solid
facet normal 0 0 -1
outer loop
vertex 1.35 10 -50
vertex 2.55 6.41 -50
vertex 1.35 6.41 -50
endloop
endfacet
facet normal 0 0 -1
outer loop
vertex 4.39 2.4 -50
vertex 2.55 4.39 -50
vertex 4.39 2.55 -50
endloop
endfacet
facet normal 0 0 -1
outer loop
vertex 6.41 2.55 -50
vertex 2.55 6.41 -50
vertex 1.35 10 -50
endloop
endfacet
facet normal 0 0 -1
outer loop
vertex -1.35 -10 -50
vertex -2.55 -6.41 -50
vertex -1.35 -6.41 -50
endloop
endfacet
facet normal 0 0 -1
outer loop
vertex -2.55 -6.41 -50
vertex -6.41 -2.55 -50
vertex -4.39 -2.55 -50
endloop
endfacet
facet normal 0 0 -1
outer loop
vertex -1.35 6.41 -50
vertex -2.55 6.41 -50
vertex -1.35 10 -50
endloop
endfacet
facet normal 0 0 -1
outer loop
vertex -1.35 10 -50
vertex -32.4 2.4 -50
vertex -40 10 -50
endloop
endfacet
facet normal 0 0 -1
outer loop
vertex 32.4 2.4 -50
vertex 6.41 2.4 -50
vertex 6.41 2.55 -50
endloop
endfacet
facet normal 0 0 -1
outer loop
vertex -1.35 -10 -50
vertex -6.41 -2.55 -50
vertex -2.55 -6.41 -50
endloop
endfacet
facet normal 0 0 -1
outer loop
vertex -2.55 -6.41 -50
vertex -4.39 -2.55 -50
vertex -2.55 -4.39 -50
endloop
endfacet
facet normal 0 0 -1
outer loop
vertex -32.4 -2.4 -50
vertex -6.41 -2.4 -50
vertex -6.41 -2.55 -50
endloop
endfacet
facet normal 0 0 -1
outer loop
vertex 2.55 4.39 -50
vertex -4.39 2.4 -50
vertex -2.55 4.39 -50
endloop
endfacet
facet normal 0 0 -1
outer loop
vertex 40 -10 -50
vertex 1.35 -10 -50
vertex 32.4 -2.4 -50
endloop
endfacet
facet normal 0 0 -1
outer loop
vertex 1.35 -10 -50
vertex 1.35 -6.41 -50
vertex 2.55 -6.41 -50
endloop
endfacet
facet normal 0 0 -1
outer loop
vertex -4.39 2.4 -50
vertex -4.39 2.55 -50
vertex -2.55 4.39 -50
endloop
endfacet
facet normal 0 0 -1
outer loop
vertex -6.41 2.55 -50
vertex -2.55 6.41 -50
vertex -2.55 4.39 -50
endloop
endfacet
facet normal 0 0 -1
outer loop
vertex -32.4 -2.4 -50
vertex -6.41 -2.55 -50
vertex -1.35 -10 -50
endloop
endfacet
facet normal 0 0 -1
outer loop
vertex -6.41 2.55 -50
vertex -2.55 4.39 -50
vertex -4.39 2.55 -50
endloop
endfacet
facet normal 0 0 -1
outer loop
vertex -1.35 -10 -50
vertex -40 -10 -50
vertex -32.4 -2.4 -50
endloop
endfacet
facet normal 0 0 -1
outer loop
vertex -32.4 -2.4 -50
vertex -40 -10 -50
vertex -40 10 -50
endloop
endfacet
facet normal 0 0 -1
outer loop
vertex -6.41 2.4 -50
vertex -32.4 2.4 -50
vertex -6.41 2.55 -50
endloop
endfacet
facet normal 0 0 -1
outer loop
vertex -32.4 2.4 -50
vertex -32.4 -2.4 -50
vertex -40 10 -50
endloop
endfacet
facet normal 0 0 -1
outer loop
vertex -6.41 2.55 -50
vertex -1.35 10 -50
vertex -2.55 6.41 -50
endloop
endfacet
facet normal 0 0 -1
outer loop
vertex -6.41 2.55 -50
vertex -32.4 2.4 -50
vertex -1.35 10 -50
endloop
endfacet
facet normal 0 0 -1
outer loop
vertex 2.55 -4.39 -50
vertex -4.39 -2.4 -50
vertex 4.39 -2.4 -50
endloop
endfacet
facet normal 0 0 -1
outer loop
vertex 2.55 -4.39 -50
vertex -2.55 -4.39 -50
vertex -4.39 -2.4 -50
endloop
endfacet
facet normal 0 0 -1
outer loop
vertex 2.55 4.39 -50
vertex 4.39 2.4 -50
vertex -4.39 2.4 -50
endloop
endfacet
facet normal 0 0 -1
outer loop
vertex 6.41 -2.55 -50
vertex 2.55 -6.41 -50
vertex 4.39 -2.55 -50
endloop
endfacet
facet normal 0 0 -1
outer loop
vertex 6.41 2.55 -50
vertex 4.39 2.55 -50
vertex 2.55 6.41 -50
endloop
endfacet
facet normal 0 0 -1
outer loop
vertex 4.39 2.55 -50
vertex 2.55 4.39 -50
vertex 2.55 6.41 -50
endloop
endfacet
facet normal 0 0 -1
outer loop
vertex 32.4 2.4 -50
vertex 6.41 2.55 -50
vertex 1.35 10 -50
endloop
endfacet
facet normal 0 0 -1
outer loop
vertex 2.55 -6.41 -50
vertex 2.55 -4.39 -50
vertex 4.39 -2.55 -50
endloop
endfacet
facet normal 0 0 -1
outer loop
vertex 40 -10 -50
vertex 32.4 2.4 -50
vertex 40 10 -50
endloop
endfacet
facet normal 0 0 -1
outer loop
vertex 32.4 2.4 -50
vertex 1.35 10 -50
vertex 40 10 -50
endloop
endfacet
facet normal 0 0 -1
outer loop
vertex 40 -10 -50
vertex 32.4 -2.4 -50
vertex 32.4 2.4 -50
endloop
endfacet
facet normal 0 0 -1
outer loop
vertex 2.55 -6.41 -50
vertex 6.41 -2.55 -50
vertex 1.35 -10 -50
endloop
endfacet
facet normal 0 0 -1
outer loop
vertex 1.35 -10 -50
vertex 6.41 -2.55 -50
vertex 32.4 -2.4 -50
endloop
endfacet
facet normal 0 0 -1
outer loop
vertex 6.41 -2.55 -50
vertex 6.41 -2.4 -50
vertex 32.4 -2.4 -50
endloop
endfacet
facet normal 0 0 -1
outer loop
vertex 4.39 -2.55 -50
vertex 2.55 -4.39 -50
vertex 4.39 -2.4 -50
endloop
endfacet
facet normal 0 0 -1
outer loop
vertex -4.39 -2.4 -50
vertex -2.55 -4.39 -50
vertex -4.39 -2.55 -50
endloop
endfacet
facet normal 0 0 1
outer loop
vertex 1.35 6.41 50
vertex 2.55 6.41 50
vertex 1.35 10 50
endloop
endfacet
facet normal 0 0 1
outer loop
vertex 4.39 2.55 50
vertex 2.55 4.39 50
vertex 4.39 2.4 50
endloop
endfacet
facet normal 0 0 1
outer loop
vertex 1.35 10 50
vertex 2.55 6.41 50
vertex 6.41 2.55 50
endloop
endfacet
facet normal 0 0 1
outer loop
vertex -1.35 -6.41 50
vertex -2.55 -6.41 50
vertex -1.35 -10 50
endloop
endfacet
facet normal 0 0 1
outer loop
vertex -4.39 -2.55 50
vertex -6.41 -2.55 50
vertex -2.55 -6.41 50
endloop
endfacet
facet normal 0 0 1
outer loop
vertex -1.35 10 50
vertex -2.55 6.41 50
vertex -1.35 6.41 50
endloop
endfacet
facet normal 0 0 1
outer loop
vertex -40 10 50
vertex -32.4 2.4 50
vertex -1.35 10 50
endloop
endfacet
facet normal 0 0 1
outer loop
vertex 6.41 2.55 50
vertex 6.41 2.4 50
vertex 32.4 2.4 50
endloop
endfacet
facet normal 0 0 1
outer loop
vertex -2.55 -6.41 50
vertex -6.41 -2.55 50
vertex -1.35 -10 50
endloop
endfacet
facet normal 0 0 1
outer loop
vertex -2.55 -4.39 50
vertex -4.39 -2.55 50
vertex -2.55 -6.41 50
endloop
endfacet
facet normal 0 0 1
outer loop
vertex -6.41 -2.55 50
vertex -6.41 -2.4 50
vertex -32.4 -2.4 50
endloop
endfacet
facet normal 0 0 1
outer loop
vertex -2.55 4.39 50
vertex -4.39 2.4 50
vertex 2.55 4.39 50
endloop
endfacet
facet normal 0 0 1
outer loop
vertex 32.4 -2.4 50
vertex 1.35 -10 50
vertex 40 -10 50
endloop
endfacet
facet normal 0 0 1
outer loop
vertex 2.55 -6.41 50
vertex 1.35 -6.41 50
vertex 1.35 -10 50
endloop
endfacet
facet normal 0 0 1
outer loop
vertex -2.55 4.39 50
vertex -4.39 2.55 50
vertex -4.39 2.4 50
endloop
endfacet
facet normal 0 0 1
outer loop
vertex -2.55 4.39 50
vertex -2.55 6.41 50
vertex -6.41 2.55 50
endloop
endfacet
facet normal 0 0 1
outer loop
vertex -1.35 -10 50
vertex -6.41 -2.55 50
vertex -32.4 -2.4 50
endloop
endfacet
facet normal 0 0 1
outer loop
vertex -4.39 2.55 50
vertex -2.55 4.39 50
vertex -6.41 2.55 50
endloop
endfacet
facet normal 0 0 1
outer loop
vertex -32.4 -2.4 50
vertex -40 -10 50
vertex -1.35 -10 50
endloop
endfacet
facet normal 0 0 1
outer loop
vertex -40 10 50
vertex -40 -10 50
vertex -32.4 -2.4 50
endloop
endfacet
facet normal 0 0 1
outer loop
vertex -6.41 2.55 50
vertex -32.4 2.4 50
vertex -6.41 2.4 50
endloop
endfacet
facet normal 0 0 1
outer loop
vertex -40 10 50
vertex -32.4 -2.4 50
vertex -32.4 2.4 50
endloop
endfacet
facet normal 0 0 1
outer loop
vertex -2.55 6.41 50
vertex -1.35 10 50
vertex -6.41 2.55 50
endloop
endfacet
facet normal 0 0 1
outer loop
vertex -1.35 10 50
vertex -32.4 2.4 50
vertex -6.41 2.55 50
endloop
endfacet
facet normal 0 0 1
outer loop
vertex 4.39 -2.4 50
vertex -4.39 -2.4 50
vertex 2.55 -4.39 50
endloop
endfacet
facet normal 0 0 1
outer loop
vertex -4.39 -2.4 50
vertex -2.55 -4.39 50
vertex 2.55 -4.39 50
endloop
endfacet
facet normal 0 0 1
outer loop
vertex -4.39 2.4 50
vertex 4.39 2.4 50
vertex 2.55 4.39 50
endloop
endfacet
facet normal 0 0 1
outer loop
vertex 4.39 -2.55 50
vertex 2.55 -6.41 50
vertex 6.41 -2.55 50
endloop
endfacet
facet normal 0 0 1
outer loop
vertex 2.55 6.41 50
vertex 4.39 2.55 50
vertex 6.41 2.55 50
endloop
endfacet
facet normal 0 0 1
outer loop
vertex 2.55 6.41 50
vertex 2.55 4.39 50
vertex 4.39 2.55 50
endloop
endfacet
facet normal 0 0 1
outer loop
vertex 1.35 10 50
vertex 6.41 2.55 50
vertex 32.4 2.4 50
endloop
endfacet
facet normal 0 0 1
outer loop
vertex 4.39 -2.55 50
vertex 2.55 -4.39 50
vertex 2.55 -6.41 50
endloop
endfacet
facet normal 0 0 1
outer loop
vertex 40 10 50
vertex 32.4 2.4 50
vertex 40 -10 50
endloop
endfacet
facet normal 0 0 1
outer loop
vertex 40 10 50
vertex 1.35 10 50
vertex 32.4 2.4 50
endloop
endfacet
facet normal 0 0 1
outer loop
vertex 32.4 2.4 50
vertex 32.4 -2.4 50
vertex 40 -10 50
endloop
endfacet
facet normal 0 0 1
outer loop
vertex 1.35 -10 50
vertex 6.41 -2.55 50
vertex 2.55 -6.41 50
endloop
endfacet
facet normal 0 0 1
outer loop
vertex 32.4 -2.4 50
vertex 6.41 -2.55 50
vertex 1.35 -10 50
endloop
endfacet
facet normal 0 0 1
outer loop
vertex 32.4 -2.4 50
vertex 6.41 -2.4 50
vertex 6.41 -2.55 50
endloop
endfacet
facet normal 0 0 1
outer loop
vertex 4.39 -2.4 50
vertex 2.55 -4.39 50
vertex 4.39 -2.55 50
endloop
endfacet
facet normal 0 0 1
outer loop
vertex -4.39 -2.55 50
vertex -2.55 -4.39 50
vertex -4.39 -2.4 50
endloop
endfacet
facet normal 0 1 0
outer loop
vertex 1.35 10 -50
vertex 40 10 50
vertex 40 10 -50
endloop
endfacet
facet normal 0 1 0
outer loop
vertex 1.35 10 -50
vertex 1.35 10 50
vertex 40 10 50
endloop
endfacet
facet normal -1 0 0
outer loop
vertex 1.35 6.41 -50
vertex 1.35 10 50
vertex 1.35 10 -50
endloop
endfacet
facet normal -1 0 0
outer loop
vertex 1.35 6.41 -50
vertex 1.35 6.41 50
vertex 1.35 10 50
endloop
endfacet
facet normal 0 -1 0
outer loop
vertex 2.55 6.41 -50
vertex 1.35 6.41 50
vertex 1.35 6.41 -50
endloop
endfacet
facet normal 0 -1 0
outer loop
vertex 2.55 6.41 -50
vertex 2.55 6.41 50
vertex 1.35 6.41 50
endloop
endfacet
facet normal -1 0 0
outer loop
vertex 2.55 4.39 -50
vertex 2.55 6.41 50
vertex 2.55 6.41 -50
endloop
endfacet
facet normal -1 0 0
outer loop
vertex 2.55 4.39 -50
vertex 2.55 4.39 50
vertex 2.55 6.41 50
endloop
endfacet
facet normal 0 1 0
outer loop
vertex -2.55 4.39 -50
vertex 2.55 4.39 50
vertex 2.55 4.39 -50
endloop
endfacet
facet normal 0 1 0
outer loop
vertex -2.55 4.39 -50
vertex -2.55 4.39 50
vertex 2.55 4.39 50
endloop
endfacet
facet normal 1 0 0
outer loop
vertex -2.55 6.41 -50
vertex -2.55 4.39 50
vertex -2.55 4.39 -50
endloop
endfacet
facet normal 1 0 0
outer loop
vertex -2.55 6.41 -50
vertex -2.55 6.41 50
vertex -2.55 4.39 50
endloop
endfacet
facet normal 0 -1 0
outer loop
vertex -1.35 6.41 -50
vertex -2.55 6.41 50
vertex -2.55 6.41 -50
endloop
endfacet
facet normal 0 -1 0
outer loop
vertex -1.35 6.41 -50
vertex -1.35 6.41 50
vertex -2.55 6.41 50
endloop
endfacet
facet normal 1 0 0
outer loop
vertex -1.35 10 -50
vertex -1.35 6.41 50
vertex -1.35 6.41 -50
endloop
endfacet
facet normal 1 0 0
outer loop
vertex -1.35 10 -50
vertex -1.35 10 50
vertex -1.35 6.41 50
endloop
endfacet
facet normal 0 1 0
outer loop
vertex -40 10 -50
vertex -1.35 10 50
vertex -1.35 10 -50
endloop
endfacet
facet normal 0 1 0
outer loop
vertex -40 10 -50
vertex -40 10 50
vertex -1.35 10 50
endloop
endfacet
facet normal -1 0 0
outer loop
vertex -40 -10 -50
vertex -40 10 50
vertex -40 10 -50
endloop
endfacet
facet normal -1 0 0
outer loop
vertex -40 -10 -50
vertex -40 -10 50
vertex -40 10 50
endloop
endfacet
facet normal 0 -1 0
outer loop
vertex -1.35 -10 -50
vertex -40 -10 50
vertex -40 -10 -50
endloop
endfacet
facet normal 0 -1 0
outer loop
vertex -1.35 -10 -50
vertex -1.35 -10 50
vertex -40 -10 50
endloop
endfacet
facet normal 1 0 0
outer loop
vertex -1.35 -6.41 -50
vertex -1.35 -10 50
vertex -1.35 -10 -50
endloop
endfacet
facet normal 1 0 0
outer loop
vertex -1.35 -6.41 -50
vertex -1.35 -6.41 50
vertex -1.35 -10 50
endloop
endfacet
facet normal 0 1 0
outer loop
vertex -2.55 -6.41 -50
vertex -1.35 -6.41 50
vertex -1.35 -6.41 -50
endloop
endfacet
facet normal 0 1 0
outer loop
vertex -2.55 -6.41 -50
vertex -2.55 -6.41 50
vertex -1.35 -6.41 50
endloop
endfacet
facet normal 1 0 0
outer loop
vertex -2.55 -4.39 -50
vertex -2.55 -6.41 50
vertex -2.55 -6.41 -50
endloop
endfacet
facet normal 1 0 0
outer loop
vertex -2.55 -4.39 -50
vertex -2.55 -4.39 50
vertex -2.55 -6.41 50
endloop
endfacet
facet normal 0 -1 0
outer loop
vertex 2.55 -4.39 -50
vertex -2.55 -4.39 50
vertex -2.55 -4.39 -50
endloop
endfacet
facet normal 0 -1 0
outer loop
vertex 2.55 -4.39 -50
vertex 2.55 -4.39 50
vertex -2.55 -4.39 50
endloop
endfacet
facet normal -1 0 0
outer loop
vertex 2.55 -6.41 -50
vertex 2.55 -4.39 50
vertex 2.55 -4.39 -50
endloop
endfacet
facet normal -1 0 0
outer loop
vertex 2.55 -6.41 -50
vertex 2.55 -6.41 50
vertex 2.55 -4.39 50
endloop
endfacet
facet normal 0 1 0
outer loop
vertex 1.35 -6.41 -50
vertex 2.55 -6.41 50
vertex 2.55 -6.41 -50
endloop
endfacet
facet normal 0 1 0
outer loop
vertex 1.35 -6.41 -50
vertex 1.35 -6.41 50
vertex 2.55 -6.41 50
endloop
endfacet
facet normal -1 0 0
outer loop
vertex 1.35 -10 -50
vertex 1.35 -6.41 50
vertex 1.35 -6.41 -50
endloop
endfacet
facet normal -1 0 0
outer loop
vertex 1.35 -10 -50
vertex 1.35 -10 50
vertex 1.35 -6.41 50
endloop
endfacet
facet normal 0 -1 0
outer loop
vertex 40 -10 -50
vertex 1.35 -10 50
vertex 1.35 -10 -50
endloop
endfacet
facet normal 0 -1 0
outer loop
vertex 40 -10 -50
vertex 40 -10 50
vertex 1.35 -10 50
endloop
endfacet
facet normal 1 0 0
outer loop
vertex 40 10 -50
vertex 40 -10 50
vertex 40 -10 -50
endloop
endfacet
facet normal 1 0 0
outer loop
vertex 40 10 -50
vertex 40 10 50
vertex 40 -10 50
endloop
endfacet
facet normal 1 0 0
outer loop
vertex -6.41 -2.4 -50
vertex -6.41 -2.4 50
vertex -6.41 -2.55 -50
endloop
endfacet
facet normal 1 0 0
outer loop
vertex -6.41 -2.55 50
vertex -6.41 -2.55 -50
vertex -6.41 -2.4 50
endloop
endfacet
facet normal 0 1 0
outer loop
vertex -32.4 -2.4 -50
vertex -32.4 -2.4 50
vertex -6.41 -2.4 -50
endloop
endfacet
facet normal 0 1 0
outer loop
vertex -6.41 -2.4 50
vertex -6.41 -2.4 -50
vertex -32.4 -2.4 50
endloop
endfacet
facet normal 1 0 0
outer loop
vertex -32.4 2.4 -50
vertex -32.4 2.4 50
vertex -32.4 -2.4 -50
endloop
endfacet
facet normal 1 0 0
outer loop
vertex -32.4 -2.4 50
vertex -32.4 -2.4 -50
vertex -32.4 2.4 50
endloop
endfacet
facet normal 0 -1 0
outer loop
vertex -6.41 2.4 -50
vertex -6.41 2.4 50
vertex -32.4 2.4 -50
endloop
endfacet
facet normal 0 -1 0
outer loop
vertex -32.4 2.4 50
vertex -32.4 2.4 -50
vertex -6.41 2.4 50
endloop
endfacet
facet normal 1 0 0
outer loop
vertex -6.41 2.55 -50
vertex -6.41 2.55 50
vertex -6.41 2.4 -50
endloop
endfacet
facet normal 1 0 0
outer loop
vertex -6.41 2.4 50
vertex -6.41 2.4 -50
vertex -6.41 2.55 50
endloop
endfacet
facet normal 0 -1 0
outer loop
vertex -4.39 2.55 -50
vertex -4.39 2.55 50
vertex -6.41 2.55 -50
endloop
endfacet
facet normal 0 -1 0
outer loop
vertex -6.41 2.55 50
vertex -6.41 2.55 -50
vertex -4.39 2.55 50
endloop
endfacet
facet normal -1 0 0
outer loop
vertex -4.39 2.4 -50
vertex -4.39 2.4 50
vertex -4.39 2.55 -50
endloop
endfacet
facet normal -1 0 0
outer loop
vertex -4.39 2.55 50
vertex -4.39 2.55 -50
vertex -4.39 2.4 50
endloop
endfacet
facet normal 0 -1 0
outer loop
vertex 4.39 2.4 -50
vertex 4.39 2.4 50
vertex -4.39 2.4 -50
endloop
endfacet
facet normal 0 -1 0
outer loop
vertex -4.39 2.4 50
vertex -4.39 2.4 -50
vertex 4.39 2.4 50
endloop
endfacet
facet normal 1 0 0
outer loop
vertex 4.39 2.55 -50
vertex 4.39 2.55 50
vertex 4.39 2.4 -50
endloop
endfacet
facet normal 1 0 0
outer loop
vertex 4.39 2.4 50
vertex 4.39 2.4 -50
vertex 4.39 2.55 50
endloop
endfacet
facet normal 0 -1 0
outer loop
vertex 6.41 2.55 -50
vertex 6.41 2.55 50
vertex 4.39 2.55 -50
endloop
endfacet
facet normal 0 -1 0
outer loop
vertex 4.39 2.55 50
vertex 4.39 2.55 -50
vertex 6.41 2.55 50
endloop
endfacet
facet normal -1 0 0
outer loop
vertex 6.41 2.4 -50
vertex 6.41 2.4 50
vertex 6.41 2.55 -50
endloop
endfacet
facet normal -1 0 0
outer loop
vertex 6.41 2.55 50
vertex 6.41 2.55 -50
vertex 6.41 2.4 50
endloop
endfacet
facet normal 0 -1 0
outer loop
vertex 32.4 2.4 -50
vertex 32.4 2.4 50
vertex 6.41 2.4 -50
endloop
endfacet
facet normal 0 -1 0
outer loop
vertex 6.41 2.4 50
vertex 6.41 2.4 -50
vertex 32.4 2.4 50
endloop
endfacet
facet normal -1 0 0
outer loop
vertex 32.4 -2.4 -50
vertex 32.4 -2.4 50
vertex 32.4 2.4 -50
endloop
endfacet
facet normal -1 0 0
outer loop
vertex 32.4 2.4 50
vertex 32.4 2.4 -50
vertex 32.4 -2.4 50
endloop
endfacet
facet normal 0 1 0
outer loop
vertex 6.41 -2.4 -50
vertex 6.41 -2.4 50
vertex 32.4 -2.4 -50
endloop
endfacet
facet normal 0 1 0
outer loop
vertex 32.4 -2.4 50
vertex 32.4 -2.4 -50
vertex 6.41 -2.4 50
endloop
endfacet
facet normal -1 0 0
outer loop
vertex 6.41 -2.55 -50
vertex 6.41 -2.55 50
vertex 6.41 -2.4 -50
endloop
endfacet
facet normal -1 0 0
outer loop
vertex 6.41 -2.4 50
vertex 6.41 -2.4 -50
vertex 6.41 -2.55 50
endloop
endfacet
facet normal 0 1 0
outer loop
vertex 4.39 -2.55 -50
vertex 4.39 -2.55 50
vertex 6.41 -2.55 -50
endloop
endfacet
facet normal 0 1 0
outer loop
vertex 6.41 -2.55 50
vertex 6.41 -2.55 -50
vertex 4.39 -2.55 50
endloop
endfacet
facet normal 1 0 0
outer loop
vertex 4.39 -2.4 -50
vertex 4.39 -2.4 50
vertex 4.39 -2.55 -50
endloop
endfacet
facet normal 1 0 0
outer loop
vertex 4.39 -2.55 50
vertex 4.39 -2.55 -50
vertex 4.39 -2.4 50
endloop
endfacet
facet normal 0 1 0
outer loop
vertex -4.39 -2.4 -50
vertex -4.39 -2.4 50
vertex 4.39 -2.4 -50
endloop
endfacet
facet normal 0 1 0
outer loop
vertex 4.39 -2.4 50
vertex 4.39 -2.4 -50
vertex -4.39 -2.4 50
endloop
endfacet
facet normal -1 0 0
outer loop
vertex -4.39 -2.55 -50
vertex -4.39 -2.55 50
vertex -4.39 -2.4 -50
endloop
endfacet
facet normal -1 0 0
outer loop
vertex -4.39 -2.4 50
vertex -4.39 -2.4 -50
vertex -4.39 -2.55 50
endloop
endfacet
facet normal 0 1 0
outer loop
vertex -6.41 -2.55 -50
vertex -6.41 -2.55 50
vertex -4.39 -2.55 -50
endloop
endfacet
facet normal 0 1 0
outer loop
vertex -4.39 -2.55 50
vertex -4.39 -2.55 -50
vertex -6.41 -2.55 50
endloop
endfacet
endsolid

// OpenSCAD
$fn = 64;

// 20x80 aluminium extrusion profile with 4 T-slots (approximation), 100mm long
length = 100;
w = 80;
h = 20;

module extrusion_20x80(len=100, w=80, h=20) {

    // Dimension-derived parameters (no arbitrary placement)
    t = min(w,h) * 0.10;                 // outer wall thickness
    slot_open = min(w,h) * 0.30;         // slot mouth width
    slot_depth = min(w,h) * 0.28;        // depth from outer face to inner cavity
    slot_neck = slot_open * 0.45;        // narrow neck width (T-slot throat)
    slot_lip = t * 0.70;                 // lip thickness at the mouth
    slot_cavity = slot_open * 0.85;      // wider inner cavity width

    // Central pocket (lightening) sized to keep a connected ring of material
    pocket_w = w - 2*(t + slot_depth);
    pocket_h = h - 2*(t + slot_depth);
    pocket_w2 = max(pocket_w, t*2);
    pocket_h2 = max(pocket_h, t*2);

    // Small overlap to avoid coincident faces in boolean ops
    eps = 0.02;

    module tslot_top() {
        // Carve a T-slot from the top face inward
        // Mouth (narrow) near the surface
        translate([0, h/2 - slot_lip/2])
            square([slot_neck, slot_lip + eps], center=true);

        // Neck channel down to cavity
        translate([0, h/2 - slot_lip - (slot_depth - slot_lip)/2])
            square([slot_neck, (slot_depth - slot_lip) + eps], center=true);

        // Inner cavity (wider) at the bottom of the slot
        translate([0, h/2 - slot_depth + (t/2)])
            square([slot_cavity, t + eps], center=true);
    }

    module profile_2d() {
        difference() {
            // Outer boundary
            square([w, h], center=true);

            // Central pocket (keeps profile hollow-ish but connected)
            square([pocket_w2, pocket_h2], center=true);

            // 4 T-slots (top/bottom/left/right), derived placements
            tslot_top();
            mirror([0,1,0]) tslot_top();
            rotate(90) tslot_top();
            rotate(-90) tslot_top();
        }
    }

    // Extrude along Z to length; center for easier viewing/verification
    linear_extrude(height=len, center=true, convexity=10)
        profile_2d();
}

extrusion_20x80(length, w, h);
